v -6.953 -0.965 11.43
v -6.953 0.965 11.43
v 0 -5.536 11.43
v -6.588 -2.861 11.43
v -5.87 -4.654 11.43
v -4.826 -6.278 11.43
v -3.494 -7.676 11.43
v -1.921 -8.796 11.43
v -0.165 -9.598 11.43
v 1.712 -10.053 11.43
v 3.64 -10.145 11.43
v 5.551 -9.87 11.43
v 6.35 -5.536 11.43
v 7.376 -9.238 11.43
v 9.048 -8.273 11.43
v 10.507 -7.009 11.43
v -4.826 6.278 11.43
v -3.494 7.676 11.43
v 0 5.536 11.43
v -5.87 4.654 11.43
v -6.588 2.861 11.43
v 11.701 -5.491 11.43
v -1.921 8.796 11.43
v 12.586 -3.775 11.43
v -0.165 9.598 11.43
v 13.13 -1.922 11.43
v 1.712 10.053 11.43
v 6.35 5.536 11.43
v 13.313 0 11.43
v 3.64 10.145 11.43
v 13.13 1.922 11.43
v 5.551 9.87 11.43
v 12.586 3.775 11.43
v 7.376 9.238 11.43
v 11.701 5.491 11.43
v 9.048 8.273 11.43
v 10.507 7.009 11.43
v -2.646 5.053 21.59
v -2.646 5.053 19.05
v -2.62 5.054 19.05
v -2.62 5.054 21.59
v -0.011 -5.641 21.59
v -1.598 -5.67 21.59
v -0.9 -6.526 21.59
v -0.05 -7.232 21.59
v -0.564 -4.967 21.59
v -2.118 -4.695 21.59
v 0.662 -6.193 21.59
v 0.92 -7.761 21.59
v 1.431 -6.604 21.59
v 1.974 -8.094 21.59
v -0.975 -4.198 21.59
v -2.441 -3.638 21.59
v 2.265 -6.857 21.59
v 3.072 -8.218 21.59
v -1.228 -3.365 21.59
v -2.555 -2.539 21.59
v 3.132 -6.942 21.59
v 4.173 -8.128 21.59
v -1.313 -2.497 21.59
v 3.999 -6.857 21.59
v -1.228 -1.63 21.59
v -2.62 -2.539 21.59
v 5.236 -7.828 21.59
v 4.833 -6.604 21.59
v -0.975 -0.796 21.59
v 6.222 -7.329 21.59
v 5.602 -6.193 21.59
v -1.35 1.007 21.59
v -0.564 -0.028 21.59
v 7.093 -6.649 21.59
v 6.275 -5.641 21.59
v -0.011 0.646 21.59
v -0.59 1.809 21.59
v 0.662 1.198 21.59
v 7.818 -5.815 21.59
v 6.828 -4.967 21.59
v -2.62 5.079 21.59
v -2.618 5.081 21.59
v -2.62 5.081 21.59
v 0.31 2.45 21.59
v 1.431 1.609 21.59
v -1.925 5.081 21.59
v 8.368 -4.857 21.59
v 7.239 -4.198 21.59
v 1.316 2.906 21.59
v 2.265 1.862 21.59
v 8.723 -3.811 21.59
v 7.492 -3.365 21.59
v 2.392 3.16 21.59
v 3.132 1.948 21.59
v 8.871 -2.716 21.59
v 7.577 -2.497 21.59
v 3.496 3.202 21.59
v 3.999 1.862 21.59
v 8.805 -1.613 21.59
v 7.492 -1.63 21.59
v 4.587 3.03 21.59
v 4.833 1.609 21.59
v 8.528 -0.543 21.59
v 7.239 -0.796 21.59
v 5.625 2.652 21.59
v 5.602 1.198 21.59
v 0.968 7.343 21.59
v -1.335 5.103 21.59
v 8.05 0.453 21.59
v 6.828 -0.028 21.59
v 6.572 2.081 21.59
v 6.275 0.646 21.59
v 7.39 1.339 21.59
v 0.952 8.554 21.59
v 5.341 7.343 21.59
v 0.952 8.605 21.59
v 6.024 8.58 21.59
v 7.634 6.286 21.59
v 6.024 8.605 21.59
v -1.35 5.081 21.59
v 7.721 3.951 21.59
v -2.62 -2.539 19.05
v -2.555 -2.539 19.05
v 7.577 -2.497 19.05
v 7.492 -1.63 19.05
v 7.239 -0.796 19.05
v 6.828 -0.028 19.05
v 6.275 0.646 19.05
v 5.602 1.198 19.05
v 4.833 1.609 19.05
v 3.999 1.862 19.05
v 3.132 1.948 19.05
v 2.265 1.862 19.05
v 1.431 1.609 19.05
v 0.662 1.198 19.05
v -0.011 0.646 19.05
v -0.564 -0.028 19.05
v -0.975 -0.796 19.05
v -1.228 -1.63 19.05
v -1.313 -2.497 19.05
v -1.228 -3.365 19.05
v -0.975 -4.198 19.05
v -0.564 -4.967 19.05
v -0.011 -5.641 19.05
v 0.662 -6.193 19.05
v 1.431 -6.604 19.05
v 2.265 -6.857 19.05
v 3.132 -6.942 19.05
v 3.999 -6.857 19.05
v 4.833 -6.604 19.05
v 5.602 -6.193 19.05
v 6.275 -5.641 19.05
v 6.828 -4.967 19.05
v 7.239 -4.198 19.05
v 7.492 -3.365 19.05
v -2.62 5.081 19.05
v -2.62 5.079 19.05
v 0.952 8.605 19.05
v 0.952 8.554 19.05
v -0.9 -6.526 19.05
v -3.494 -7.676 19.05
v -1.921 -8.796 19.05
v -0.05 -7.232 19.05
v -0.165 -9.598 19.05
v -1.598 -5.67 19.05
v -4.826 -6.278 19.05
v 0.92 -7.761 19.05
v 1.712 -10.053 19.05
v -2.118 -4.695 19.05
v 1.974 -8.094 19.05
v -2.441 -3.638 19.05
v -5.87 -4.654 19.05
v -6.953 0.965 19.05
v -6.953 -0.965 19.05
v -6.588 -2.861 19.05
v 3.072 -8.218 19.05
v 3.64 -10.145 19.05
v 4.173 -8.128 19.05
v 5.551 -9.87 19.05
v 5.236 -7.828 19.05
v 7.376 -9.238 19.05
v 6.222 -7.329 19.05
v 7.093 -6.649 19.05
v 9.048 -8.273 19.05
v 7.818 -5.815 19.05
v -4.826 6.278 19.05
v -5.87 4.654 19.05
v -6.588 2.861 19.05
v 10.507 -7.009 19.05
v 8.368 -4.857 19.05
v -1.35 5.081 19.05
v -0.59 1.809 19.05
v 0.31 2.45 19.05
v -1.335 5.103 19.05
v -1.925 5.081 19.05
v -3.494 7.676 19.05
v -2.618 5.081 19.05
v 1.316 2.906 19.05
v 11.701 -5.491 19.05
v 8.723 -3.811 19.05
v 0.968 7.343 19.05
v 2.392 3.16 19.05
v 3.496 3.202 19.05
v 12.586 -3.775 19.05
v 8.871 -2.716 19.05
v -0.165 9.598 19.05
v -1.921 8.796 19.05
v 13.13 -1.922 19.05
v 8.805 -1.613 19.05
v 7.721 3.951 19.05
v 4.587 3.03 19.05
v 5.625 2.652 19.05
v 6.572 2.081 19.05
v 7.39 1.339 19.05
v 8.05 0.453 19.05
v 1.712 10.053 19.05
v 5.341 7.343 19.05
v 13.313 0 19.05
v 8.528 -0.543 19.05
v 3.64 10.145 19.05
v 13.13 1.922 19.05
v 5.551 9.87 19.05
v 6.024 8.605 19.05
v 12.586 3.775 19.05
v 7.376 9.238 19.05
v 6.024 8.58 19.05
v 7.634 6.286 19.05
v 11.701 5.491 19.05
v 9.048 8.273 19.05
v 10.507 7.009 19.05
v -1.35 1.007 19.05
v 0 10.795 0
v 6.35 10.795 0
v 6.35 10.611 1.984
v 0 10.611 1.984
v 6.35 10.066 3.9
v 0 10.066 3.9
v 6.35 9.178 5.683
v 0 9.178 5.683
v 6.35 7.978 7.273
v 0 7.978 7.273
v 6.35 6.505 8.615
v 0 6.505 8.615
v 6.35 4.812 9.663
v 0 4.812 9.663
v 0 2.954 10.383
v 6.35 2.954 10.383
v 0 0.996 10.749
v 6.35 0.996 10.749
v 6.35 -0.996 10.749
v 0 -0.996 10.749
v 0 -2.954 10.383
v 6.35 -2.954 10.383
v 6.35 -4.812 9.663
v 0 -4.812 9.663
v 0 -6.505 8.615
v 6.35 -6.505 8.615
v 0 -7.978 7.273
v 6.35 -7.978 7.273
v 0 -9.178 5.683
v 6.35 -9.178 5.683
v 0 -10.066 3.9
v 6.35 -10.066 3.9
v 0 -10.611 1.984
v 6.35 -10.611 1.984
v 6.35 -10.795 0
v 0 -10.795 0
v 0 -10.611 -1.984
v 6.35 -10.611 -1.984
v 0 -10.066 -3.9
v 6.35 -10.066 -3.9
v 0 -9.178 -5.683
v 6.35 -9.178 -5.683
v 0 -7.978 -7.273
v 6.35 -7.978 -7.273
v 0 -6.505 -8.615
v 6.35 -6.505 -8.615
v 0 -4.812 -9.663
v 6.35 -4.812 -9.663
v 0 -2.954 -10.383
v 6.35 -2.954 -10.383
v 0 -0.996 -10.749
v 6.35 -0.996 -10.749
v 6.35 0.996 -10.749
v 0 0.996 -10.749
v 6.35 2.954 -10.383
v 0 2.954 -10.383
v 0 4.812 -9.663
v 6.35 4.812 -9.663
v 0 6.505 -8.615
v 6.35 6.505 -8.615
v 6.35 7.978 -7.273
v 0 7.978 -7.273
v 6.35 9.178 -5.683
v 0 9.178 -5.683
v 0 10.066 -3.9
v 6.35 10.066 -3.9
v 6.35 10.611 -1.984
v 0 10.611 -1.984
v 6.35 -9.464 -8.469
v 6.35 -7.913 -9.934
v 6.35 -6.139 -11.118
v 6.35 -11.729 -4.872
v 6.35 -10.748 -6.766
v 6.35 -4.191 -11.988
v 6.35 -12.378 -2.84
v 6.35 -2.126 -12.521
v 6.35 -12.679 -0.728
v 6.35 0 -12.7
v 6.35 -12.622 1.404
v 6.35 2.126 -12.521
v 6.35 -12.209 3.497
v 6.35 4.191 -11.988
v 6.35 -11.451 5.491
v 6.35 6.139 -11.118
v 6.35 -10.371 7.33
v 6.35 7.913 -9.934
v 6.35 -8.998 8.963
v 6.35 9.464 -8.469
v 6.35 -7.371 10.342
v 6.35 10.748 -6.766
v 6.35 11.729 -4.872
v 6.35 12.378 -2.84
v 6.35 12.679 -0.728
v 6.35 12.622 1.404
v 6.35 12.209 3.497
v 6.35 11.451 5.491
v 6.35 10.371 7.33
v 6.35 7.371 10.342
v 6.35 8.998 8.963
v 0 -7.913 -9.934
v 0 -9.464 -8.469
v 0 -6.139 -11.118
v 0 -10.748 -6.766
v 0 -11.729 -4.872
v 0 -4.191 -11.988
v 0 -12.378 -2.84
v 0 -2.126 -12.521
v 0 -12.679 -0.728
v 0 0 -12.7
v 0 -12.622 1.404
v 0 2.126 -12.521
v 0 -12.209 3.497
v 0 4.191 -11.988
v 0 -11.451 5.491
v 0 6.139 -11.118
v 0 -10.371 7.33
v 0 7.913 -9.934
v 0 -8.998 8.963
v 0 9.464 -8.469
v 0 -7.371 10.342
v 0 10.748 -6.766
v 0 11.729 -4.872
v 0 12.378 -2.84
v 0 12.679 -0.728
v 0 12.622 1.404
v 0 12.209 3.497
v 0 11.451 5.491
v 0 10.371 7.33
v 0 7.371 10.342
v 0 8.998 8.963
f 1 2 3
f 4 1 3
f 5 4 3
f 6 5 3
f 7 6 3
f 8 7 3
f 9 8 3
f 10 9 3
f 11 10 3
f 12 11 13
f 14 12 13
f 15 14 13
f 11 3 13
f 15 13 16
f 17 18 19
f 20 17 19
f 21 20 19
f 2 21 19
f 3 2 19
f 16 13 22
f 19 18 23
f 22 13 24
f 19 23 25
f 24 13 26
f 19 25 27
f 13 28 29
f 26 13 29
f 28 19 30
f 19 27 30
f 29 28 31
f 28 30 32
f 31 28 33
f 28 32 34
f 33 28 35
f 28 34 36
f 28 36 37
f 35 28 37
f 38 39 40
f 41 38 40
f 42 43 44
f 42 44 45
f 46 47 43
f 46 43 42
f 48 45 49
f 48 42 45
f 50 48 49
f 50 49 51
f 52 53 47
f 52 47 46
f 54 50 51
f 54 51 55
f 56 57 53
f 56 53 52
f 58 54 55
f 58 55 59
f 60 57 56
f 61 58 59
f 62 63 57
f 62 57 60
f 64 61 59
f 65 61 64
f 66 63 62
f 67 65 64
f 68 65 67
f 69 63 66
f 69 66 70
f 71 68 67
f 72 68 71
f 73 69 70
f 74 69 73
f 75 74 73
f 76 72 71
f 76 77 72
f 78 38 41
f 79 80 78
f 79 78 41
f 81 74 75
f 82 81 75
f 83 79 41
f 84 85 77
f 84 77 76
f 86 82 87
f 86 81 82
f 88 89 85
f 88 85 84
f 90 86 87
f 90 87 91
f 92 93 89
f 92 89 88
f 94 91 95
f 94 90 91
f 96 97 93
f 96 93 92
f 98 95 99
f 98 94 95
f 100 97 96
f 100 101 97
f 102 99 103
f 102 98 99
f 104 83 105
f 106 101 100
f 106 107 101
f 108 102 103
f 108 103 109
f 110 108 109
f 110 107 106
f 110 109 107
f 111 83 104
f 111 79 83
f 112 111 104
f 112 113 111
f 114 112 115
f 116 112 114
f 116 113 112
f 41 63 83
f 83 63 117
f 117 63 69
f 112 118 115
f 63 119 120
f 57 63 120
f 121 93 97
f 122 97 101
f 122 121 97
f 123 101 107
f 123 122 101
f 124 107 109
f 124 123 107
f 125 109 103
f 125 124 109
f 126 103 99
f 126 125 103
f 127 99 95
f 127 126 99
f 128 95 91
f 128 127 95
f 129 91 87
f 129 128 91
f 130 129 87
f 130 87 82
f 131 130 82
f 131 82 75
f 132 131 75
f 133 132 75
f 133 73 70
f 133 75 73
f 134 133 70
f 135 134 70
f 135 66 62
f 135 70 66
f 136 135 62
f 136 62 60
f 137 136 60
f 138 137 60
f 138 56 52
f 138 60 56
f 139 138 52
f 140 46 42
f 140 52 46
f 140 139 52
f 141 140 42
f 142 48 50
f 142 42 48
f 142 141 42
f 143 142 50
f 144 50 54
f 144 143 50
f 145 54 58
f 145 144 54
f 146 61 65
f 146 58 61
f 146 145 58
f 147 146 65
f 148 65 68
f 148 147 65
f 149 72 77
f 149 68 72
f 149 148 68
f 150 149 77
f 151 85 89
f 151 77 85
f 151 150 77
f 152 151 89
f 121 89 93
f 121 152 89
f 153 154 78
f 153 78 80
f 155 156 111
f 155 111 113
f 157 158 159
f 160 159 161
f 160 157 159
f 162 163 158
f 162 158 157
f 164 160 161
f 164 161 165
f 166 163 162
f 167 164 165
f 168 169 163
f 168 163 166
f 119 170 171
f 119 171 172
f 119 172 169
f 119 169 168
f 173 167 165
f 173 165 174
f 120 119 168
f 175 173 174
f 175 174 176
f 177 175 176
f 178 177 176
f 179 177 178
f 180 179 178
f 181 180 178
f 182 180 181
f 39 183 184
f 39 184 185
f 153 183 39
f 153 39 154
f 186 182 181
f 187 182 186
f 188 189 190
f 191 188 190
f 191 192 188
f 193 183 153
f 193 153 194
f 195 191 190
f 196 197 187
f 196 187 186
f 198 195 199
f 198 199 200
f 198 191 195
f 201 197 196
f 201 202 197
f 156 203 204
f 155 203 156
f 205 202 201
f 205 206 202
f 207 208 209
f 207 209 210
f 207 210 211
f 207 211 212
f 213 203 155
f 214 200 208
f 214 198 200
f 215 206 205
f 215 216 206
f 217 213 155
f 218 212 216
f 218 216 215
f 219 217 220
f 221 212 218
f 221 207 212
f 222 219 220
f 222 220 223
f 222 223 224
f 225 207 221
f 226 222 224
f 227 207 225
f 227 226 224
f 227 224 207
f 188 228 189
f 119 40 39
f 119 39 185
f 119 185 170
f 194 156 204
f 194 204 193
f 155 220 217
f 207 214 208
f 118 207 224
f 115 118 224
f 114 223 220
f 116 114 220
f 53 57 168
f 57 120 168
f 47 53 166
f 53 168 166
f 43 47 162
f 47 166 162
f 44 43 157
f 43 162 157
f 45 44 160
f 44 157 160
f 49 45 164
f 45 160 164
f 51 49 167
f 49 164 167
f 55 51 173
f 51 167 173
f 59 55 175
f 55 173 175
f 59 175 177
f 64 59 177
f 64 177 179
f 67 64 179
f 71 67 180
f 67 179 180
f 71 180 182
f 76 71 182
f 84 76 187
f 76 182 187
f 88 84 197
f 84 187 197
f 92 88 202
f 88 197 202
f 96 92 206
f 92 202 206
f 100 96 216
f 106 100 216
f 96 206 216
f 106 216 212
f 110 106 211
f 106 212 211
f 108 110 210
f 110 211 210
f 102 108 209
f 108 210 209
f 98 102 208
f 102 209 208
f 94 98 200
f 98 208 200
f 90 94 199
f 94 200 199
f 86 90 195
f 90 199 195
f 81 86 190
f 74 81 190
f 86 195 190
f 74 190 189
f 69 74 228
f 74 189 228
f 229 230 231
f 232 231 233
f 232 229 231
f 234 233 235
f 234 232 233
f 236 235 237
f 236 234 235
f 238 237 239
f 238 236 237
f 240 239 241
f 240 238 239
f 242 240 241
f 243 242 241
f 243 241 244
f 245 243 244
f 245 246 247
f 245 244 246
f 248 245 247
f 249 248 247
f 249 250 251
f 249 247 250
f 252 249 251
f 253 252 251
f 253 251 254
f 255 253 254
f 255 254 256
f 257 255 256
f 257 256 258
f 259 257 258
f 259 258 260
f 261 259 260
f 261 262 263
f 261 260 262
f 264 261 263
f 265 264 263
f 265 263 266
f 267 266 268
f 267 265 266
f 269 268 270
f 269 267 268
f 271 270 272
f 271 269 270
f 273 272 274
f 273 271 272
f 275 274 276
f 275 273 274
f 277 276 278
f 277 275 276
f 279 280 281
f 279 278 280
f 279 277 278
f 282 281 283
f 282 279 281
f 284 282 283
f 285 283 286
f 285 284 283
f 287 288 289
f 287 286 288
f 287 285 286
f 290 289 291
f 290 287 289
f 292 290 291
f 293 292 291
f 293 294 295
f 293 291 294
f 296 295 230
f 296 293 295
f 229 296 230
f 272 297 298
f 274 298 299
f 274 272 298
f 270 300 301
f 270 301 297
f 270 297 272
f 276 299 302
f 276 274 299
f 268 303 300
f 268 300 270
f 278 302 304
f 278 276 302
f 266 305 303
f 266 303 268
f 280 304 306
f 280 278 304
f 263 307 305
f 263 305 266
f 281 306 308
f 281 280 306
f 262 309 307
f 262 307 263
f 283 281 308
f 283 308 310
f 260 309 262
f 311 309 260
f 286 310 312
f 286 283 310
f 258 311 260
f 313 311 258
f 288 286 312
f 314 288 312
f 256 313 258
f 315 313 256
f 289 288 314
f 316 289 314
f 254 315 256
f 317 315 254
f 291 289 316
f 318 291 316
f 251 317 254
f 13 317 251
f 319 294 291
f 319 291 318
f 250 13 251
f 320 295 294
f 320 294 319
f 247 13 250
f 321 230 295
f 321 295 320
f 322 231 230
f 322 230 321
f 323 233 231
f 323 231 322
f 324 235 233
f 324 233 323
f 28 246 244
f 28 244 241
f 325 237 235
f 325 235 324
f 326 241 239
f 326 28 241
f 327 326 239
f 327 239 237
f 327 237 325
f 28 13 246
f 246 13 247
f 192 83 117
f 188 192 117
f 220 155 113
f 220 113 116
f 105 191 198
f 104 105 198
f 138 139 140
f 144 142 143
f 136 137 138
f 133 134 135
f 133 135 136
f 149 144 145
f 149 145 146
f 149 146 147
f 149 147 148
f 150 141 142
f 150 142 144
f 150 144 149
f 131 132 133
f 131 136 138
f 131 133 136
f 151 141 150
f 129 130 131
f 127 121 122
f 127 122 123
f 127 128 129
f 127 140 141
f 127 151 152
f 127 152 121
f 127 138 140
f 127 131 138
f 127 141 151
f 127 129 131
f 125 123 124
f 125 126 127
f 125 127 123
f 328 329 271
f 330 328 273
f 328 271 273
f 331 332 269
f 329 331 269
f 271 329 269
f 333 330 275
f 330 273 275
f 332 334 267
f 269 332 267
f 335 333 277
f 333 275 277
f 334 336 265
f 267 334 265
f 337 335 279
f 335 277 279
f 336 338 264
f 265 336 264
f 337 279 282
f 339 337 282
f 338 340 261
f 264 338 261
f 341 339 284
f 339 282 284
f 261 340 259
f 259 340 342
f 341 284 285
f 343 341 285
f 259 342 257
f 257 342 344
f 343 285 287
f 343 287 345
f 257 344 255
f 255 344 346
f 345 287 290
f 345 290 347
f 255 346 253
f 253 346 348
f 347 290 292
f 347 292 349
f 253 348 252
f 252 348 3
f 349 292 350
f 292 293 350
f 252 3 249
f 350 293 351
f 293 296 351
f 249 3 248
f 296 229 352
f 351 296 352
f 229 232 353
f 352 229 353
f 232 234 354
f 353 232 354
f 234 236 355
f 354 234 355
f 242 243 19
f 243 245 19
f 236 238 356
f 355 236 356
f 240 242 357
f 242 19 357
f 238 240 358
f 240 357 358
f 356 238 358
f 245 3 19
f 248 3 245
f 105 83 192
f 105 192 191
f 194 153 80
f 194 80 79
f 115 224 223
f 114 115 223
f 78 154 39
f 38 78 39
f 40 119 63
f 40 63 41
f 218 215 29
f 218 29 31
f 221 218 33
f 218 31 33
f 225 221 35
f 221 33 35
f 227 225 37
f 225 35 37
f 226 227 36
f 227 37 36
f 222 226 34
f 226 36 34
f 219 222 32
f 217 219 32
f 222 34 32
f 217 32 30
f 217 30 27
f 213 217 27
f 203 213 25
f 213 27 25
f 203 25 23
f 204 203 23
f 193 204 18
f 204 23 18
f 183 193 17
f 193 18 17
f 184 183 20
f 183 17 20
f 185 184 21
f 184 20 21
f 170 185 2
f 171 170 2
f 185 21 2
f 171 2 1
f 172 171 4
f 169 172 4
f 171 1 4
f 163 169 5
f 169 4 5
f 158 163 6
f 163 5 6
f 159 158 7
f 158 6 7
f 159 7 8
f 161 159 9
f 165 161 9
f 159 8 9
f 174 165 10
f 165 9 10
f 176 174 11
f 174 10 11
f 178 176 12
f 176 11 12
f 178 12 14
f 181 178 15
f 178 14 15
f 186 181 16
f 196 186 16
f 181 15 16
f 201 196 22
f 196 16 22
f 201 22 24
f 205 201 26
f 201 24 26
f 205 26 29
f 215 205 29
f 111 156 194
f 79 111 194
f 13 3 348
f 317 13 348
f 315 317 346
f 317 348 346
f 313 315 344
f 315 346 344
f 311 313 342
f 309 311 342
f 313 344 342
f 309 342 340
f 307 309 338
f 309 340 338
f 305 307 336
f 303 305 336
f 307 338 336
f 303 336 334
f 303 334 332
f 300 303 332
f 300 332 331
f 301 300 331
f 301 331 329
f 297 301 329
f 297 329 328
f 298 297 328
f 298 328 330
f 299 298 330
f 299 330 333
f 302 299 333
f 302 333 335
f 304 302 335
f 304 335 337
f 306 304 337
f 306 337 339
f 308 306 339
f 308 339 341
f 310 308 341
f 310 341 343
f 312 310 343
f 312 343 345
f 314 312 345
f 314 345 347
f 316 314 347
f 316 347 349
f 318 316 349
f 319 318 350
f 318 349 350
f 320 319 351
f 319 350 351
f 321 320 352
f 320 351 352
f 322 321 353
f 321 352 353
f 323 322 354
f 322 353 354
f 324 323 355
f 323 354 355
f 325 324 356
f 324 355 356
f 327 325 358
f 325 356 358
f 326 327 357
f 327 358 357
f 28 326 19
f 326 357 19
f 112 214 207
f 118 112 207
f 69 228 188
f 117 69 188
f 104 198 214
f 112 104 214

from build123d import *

# Parameters (mm, degrees)
F0_R      = 12.7
F1_DEPTH  = 6.35
F2_R      = 10.795
F3_DEPTH  = 55.83853
F6_R      = 10.156235
F7_DEPTH  = 7.62
F9_R      = 5.715
F10_DEPTH = 2.54
F11_R     = 4.445
F12_DEPTH = 25.4
F13_W     = 1.27
F13_H     = 7.62
F14_DEPTH = 2.54
F16_DEPTH = 2.54
F17_W     = 5.072208
F17_H     = 1.261867
F18_DEPTH = 2.54
F20_DEPTH = 2.54


with BuildPart() as f1:
    # F0 (on Right) → F1 (new body)
    with BuildSketch(Plane.YZ):
        Circle(F0_R)
    extrude(amount=F1_DEPTH)

    # F2 (on Right) → F3 (cut)
    with BuildSketch(Plane.YZ):
        Circle(F2_R)
    extrude(amount=F3_DEPTH, mode=Mode.SUBTRACT)

    # F6 (on offset) → F7 (join)
    with BuildSketch(Plane.XY.offset(11.43)):
        with Locations((3.156903, 0)):
            Circle(F6_R)
    extrude(amount=F7_DEPTH)

    # F9 (on offset) → F10 (join)
    with BuildSketch(Plane.XY.offset(19.05)):
        with Locations((3.159848, -2.503511)):
            Circle(F9_R)
    extrude(amount=F10_DEPTH)

    # F11 (on offset) → F12 (cut)
    with BuildSketch(Plane.XY.offset(19.05)):
        with Locations((3.132005, -2.497431)):
            Circle(F11_R)
    extrude(amount=F12_DEPTH, mode=Mode.SUBTRACT)

    # F13 (on offset) → F14 (join)
    with BuildSketch(Plane.XY.offset(19.05)):
        with Locations((-1.985011, 1.270657)):
            Rectangle(F13_W, F13_H)
    extrude(amount=F14_DEPTH)

    # F15 (on offset) → F16 (join)
    with BuildSketch(Plane.XY.offset(19.05)):
        Polygon((0.990725, 8.591608), (-2.646419, 5.053434), (-1.335068, 5.102919), (2.251208, 8.591608), align=None)
    extrude(amount=F16_DEPTH)

    # F17 (on offset) → F18 (join)
    with BuildSketch(Plane.XY.offset(19.05)):
        with Locations((3.487949, 7.974144)):
            Rectangle(F17_W, F17_H)
    extrude(amount=F18_DEPTH)

    # F19 (on offset) → F20 (join)
    with BuildSketch(Plane.XY.offset(19.05)):
        Polygon((6.024053, 8.580334), (5.277778, 7.432801), (7.72065, 3.951121), (7.633835, 6.286007), align=None)
    extrude(amount=F20_DEPTH)


solid = f1.part
